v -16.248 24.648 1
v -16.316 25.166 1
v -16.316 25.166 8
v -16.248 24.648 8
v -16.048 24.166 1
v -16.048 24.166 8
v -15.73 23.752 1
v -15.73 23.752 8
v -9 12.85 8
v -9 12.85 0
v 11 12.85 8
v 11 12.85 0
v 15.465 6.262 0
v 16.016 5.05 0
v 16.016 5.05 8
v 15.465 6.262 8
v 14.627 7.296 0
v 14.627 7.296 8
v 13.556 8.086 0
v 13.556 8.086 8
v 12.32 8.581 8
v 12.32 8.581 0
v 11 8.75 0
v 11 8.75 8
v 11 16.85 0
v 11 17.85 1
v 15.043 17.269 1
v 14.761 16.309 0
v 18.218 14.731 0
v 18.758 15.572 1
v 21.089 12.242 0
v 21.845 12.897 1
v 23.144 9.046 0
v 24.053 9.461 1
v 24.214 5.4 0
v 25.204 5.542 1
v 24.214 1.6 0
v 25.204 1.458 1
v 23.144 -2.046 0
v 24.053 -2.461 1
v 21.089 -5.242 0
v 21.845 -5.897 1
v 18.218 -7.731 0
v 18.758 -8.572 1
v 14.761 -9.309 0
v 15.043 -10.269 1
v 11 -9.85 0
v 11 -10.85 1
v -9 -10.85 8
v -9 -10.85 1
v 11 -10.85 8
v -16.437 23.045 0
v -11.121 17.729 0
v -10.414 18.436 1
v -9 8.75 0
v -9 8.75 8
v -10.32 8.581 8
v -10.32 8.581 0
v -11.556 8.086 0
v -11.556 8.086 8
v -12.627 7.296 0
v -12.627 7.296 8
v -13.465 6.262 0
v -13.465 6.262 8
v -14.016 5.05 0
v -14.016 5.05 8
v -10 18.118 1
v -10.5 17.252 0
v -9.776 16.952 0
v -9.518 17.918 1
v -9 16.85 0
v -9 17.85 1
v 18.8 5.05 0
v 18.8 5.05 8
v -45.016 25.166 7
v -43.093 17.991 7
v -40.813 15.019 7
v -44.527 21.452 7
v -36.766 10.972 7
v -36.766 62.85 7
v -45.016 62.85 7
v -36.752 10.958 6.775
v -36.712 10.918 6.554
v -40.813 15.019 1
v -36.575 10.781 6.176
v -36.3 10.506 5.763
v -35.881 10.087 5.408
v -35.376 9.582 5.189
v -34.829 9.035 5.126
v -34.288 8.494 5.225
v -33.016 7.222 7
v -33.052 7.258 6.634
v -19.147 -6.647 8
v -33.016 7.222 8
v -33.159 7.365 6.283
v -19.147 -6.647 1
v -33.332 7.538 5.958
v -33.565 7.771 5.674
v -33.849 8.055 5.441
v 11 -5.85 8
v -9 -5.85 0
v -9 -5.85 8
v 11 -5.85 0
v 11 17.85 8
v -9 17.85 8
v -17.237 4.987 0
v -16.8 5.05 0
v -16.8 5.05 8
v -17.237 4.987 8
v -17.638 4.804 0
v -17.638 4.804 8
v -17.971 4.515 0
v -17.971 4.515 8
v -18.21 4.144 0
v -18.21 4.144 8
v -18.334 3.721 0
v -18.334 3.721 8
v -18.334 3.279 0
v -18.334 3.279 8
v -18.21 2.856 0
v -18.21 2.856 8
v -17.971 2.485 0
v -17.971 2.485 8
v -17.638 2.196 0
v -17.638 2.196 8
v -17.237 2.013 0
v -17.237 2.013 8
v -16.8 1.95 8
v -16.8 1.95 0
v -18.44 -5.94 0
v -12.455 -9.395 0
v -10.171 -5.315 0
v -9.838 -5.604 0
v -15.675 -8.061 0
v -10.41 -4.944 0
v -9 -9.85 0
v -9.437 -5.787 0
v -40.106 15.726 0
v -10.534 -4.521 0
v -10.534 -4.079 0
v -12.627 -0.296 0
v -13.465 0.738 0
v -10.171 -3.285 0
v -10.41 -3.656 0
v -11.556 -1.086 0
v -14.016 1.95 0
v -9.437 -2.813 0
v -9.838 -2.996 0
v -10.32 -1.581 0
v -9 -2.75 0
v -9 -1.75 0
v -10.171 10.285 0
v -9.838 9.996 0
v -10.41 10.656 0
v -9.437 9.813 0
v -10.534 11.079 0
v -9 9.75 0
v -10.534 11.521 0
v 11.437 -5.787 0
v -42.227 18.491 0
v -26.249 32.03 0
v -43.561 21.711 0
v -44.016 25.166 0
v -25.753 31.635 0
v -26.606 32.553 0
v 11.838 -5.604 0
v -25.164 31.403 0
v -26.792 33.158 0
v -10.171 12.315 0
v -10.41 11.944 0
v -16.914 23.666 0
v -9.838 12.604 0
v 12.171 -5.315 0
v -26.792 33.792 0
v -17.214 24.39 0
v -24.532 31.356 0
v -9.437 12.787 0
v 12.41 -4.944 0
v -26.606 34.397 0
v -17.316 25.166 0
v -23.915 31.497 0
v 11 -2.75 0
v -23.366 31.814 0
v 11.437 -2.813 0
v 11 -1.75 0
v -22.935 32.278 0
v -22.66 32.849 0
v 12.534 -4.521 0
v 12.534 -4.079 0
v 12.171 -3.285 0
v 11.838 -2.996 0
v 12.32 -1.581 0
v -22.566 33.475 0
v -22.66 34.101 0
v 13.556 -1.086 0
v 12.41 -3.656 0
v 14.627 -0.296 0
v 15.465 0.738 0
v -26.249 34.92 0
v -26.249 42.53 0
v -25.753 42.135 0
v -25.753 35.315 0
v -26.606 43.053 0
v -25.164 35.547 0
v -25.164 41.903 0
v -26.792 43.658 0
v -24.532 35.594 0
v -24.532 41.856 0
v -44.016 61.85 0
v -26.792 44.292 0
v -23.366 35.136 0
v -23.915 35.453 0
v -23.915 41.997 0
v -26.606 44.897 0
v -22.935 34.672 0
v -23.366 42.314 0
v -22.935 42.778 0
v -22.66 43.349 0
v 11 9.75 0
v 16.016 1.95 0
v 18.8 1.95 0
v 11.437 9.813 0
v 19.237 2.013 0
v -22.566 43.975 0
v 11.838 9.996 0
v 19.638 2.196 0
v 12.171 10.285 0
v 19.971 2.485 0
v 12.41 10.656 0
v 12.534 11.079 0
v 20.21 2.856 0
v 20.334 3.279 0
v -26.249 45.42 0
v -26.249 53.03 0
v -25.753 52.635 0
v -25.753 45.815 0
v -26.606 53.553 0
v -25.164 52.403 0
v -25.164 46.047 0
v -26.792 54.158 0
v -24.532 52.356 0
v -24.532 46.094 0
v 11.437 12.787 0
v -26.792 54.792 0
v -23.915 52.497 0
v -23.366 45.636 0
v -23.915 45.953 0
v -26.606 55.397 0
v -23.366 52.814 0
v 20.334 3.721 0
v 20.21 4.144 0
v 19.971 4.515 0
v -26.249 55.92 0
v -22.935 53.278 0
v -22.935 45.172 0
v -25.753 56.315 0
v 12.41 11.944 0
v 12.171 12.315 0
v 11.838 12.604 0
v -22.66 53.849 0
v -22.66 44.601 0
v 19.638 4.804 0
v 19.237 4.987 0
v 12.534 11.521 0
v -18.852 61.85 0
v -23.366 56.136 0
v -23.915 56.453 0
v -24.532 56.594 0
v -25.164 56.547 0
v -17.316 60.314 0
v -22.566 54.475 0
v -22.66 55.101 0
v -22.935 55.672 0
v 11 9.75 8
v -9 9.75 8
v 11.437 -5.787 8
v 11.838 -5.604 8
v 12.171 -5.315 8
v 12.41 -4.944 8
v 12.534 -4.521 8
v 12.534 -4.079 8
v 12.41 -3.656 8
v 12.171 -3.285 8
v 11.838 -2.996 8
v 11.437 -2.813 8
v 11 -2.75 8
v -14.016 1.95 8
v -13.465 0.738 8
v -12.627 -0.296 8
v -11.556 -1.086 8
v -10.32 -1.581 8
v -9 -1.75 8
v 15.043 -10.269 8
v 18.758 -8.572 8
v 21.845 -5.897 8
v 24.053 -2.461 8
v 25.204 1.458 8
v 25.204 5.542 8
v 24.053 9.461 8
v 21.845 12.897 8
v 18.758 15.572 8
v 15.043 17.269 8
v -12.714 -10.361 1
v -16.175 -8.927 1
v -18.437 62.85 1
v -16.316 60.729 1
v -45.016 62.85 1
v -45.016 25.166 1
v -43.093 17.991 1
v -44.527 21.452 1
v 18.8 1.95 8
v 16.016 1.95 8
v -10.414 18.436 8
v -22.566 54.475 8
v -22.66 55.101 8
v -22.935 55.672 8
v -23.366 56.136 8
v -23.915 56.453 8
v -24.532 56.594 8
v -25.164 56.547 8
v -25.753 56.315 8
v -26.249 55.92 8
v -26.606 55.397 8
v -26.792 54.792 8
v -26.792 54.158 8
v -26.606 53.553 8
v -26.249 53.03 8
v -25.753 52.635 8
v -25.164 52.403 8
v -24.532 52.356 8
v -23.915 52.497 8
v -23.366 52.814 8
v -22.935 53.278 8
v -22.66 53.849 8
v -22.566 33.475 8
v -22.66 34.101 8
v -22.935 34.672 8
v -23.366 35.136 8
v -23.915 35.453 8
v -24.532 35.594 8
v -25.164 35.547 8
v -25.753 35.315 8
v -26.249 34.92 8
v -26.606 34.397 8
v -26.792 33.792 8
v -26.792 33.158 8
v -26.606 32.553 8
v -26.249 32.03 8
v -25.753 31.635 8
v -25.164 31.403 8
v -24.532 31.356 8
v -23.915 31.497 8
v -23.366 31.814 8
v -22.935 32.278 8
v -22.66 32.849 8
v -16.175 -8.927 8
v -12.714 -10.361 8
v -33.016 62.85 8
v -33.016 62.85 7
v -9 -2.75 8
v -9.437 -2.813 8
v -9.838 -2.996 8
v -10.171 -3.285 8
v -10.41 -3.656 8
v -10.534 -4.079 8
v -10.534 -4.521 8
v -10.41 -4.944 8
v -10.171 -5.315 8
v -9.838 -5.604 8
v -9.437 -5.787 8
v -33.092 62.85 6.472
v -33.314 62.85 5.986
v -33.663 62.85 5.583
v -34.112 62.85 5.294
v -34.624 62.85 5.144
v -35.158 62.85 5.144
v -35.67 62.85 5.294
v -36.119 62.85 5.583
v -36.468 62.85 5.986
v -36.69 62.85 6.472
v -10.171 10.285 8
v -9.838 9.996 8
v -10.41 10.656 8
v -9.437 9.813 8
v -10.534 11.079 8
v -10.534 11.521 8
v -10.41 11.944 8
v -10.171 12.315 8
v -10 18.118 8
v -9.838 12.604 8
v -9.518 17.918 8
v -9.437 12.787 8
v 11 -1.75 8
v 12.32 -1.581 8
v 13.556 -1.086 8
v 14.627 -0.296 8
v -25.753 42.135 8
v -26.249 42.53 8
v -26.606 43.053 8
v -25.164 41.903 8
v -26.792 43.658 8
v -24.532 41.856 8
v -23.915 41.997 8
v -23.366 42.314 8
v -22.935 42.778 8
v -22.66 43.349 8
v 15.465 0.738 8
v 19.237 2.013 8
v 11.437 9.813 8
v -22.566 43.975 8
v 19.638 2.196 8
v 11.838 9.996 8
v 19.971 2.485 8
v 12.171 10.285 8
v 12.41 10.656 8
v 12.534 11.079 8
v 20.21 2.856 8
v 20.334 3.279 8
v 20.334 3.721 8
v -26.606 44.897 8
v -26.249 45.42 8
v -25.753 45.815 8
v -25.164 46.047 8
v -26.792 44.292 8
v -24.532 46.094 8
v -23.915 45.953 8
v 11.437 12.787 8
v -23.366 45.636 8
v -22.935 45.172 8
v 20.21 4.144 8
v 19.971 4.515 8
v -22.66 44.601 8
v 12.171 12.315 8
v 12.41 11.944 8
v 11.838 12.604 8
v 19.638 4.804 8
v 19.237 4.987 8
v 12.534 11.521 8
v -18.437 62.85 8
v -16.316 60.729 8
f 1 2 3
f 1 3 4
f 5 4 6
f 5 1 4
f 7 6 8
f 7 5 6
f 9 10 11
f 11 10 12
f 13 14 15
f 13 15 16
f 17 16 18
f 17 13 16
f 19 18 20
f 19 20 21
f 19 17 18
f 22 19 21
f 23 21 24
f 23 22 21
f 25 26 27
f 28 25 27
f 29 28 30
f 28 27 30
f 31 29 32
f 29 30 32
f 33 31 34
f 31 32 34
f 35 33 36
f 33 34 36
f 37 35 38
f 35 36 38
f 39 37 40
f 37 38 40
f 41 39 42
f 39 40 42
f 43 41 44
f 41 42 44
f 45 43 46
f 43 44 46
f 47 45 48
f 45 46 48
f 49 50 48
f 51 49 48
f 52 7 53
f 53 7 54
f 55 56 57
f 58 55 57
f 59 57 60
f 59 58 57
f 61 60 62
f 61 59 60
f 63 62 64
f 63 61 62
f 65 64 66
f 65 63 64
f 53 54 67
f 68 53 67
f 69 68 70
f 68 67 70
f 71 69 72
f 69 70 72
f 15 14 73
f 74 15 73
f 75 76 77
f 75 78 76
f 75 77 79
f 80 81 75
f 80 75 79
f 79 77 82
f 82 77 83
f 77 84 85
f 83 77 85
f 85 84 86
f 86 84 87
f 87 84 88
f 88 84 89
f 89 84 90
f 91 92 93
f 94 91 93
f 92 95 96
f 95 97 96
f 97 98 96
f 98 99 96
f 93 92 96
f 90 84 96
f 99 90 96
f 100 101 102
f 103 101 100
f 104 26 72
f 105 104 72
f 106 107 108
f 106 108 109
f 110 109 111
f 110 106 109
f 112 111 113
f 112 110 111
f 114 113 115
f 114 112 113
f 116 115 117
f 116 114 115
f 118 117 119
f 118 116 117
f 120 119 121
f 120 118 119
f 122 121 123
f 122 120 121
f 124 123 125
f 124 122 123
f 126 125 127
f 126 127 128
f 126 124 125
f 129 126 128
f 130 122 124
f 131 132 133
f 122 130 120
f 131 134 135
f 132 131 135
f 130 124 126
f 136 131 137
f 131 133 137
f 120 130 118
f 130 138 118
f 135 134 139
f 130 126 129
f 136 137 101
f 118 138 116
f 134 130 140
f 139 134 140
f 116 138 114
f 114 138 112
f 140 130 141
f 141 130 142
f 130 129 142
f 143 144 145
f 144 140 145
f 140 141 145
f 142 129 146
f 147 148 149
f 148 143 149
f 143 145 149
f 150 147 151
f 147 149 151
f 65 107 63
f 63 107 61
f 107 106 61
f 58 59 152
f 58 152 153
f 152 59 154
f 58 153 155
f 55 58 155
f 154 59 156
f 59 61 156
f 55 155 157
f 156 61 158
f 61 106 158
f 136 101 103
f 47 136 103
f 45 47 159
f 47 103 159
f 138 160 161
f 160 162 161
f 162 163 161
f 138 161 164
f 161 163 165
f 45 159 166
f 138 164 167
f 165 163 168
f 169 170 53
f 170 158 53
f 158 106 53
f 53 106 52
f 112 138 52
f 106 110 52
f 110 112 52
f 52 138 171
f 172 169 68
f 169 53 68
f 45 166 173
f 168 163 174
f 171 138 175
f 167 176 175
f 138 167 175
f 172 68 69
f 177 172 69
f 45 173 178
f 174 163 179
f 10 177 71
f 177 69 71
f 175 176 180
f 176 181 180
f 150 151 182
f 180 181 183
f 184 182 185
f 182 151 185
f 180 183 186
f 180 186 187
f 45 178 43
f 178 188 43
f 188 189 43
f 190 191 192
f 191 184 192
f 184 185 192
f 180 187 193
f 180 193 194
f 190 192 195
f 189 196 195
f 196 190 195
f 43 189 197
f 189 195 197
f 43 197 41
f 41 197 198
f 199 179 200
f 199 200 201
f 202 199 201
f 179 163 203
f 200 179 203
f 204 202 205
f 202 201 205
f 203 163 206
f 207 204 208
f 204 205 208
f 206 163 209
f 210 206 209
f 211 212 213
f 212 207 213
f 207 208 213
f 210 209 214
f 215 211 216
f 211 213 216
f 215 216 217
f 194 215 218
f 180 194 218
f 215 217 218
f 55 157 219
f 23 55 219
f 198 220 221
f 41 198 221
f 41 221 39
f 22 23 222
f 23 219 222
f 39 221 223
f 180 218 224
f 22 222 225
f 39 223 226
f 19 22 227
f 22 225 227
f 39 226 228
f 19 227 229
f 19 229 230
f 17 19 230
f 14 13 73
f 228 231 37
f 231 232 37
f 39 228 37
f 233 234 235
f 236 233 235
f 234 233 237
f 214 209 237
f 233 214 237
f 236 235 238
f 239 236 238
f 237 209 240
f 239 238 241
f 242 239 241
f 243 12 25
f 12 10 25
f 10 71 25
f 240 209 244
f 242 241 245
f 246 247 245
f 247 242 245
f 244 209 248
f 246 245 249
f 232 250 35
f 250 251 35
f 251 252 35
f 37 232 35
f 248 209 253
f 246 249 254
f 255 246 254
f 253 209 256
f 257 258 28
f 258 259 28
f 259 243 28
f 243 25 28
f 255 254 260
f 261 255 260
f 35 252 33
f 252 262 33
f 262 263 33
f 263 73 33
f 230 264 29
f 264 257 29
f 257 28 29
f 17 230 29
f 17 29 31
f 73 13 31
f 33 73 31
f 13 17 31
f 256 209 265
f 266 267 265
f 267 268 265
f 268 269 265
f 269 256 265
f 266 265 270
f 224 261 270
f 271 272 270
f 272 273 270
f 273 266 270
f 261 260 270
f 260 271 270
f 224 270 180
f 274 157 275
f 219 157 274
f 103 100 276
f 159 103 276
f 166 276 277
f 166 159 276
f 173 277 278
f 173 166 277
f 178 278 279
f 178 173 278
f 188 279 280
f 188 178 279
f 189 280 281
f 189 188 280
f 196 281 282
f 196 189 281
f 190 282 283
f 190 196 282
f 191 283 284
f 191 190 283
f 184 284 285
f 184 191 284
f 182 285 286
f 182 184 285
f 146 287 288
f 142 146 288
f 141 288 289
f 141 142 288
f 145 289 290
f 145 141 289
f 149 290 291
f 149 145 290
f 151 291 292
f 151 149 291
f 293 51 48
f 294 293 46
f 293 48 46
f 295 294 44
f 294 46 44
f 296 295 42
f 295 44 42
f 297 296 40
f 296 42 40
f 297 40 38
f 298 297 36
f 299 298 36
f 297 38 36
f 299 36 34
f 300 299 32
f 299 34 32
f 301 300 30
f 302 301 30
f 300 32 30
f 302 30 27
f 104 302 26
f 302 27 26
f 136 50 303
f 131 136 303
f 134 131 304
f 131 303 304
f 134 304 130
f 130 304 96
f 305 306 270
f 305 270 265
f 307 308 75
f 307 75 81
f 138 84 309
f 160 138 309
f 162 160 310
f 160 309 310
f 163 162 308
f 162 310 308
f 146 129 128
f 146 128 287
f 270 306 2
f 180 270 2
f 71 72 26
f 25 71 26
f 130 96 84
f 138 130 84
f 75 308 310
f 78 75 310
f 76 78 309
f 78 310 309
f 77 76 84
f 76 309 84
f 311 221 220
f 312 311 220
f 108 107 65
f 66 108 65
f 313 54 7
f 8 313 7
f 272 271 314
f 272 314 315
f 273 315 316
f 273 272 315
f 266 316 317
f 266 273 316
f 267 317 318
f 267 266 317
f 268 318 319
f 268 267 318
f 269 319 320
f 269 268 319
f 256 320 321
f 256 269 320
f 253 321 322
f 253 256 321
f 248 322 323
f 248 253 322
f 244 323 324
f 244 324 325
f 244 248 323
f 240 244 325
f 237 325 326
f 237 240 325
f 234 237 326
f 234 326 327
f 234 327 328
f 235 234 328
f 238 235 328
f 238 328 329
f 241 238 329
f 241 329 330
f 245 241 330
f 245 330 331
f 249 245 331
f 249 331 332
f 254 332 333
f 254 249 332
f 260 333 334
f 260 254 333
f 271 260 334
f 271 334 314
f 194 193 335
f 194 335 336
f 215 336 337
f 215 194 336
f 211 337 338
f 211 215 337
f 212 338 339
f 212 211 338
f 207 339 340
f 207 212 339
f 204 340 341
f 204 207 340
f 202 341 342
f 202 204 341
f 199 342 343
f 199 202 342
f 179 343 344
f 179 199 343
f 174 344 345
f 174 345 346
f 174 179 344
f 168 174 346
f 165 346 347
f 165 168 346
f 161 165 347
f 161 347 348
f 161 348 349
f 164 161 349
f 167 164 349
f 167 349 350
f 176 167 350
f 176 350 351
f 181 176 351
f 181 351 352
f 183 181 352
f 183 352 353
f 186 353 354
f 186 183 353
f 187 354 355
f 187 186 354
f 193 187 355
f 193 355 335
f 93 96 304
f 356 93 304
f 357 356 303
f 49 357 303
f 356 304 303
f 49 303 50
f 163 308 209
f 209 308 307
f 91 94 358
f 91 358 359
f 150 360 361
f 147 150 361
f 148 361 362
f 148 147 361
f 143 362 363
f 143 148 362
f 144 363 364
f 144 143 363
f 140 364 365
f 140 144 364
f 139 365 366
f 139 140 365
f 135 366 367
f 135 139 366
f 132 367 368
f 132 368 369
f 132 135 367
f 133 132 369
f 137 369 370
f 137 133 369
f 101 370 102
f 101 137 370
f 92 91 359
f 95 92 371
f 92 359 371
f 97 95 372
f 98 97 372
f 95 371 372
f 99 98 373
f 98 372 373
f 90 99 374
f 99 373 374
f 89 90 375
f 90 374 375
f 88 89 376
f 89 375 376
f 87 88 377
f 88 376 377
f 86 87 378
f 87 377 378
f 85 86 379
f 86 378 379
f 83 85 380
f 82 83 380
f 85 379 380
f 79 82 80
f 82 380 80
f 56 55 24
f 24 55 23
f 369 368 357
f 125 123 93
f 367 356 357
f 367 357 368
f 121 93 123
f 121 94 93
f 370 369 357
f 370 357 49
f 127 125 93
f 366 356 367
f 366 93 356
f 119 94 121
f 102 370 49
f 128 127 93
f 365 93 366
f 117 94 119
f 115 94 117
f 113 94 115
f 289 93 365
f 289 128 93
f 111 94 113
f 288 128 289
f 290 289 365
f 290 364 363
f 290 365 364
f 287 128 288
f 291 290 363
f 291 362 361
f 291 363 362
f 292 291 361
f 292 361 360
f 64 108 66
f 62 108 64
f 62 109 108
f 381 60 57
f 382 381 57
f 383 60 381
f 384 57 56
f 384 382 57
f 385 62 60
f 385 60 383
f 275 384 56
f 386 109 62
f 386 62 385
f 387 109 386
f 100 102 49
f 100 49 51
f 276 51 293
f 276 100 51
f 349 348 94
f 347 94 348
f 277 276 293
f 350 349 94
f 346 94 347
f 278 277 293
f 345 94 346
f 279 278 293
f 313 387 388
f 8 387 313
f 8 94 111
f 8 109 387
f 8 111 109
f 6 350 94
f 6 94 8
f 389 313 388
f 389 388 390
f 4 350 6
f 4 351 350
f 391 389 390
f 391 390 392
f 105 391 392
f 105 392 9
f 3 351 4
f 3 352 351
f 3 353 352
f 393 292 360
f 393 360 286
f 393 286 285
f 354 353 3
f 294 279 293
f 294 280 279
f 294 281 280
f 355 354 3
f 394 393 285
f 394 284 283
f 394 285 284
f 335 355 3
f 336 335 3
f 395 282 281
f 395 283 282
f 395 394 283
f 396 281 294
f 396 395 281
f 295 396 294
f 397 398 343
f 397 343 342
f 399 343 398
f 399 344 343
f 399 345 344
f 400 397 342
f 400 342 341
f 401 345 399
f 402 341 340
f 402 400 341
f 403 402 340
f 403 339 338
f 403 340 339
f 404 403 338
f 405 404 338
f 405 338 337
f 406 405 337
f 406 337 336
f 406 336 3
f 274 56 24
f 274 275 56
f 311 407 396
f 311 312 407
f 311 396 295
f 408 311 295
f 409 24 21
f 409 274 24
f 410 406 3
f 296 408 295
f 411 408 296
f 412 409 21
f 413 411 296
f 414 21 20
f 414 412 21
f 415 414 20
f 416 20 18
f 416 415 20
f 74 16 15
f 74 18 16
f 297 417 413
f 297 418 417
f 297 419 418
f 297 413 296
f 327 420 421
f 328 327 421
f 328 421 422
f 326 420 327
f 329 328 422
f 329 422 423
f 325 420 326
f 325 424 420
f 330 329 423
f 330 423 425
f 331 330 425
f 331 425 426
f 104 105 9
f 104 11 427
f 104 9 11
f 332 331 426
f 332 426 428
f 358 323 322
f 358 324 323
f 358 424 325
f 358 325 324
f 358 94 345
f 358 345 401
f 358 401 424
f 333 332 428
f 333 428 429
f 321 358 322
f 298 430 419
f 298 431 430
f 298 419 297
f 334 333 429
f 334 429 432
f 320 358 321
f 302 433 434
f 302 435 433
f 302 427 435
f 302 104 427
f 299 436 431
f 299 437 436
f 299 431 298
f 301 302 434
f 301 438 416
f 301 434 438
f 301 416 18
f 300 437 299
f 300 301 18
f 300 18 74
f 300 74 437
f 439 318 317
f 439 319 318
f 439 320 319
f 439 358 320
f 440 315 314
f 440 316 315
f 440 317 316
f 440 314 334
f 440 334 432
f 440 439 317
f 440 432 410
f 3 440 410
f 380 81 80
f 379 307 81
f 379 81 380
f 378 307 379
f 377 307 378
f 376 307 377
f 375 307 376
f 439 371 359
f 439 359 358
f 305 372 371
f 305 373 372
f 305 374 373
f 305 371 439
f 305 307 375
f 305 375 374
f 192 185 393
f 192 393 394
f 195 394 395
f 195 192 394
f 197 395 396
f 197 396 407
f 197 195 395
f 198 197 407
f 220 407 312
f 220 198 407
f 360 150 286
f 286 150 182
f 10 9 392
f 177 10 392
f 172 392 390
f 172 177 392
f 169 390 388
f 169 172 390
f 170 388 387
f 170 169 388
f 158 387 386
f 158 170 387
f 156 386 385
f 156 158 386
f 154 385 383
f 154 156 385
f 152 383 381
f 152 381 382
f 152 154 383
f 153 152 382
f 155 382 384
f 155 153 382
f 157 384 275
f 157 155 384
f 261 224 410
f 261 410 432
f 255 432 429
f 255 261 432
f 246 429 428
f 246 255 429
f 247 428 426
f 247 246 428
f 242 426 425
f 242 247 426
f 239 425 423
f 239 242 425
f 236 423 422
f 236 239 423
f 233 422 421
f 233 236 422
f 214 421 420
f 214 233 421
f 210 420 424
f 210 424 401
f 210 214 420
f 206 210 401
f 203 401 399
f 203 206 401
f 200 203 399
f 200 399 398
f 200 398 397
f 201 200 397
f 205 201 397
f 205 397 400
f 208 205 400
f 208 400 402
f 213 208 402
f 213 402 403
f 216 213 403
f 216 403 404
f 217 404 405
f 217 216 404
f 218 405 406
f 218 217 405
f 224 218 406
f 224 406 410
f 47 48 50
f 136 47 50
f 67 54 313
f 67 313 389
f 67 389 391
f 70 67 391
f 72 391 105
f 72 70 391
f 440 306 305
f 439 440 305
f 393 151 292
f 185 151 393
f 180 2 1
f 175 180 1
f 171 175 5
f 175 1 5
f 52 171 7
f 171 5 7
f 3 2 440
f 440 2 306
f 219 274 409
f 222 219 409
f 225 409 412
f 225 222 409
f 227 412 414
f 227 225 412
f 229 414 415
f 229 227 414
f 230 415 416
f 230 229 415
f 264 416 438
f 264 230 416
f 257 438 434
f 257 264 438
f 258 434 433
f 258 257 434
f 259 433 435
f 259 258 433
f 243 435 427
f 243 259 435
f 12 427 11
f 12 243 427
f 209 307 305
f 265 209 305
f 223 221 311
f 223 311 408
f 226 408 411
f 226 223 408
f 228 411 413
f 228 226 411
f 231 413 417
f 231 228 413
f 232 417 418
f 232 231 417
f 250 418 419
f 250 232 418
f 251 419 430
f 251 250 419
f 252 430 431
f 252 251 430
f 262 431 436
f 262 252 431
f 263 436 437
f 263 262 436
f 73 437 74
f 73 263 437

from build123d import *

# Parameters (mm, degrees)
SKETCH007_R     = 2.125
PAD002_DEPTH    = 8
POCKET005_DEPTH = 73.701
CHAMFER003_SIZE = 1


with BuildPart() as part:
    # Sketch007 → Pad002 (new body)
    with BuildSketch(Plane.XY):
        with BuildLine():
            ThreePointArc((0, -14.35), (14.35, 0), (0, 14.35))
            Line((0, 14.35), (-20, 14.35))
            ThreePointArc((-21.414214, 14.935786), (-20.765367, 14.502241), (-20, 14.35))
            Line((-21.414214, 14.935786), (-26.730188, 20.251761))
            ThreePointArc((-27.315974, 21.665974), (-27.163734, 20.900608), (-26.730188, 20.251761))
            Line((-27.315974, 21.665974), (-27.315974, 57.22868))
            Line((-27.315974, 57.22868), (-29.437295, 59.35))
            Line((-56.015974, 59.35), (-29.437295, 59.35))
            Line((-56.015974, 21.665974), (-56.015974, 59.35))
            ThreePointArc((-56.015974, 21.665974), (-54.923646, 16.174467), (-51.812957, 11.518992))
            Line((-51.812957, 11.518992), (-30.146982, -10.146982))
            ThreePointArc((-30.146982, -10.146982), (-25.491507, -13.257671), (-20, -14.35))
            Line((-20, -14.35), (0, -14.35))
        make_face()
        with Locations((-35.690974, 50.975)):
            Circle(SKETCH007_R, mode=Mode.SUBTRACT)
        with Locations((-35.690974, 40.475)):
            Circle(SKETCH007_R, mode=Mode.SUBTRACT)
        with Locations((-35.690974, 29.975)):
            Circle(SKETCH007_R, mode=Mode.SUBTRACT)
        with BuildLine():
            ThreePointArc((0, 6.25), (1.55, 7.8), (0, 9.35))
            Line((-20, 9.35), (0, 9.35))
            ThreePointArc((-20, 9.35), (-21.55, 7.8), (-20, 6.25))
            Line((-20, 6.25), (0, 6.25))
        make_face(mode=Mode.SUBTRACT)
        with BuildLine():
            ThreePointArc((-20, -6.25), (-21.55, -7.8), (-20, -9.35))
            Line((-20, -9.35), (0, -9.35))
            ThreePointArc((0, -9.35), (1.55, -7.8), (0, -6.25))
            Line((-20, -6.25), (0, -6.25))
        make_face(mode=Mode.SUBTRACT)
        with BuildLine():
            ThreePointArc((7.8, -1.55), (9.35, 0), (7.8, 1.55))
            Line((5.015974, 1.55), (7.8, 1.55))
            ThreePointArc((5.015974, 1.55), (3.116488, 4.224926), (0, 5.25))
            Line((-20, 5.25), (0, 5.25))
            ThreePointArc((-20, 5.25), (-23.116488, 4.224926), (-25.015974, 1.55))
            Line((-27.8, 1.55), (-25.015974, 1.55))
            ThreePointArc((-27.8, 1.55), (-29.35, 0), (-27.8, -1.55))
            Line((-27.8, -1.55), (-25.015974, -1.55))
            ThreePointArc((-25.015974, -1.55), (-23.116488, -4.224926), (-20, -5.25))
            Line((-20, -5.25), (0, -5.25))
            ThreePointArc((0, -5.25), (3.116488, -4.224926), (5.015974, -1.55))
            Line((7.8, -1.55), (5.015974, -1.55))
        make_face(mode=Mode.SUBTRACT)
    extrude(amount=PAD002_DEPTH)

    # Sketch008 (on Face12 of Pad002) → Pocket005 (cut, through all)
    with BuildSketch(Plane(origin=(0, 59.35, 0), x_dir=(-1, 0, 0), z_dir=(0, 1, 0))):
        with BuildLine():
            Line((56.015974, 7), (47.765974, 7))
            ThreePointArc((44.015974, 7), (45.890974, 5.125), (47.765974, 7))
            Line((44.015974, 8), (44.015974, 7))
            Line((44.015974, 8), (56.015974, 8))
            Line((56.015974, 8), (56.015974, 7))
        make_face()
    extrude(amount=-POCKET005_DEPTH, mode=Mode.SUBTRACT)

    # Chamfer003
    chamfer003_edges = [part.edges().sort_by_distance(p)[0] for p in [
        (-42.726635, 59.35, 0),
        (-56.015974, 40.507987, 0),
        (-54.923646, 16.174467, 0),
        (-40.97997, 0.686005, 0),
        (-25.491507, -13.257671, 0),
        (-10, -14.35, 0),
        (14.35, 0, 0),
        (-10, 14.35, 0),
        (-20.765367, 14.502241, 0),
        (-24.072201, 17.593774, 0),
        (-27.163734, 20.900608, 0),
        (-27.315974, 39.447327, 0),
        (-28.376635, 58.28934, 0),
    ]]
    chamfer(chamfer003_edges, length=CHAMFER003_SIZE)


with BuildPart() as part_1:
    # Body002 placement: moved
    add(part.part.moved(Location((11, 3.5, 0))))


solid = part_1.part
